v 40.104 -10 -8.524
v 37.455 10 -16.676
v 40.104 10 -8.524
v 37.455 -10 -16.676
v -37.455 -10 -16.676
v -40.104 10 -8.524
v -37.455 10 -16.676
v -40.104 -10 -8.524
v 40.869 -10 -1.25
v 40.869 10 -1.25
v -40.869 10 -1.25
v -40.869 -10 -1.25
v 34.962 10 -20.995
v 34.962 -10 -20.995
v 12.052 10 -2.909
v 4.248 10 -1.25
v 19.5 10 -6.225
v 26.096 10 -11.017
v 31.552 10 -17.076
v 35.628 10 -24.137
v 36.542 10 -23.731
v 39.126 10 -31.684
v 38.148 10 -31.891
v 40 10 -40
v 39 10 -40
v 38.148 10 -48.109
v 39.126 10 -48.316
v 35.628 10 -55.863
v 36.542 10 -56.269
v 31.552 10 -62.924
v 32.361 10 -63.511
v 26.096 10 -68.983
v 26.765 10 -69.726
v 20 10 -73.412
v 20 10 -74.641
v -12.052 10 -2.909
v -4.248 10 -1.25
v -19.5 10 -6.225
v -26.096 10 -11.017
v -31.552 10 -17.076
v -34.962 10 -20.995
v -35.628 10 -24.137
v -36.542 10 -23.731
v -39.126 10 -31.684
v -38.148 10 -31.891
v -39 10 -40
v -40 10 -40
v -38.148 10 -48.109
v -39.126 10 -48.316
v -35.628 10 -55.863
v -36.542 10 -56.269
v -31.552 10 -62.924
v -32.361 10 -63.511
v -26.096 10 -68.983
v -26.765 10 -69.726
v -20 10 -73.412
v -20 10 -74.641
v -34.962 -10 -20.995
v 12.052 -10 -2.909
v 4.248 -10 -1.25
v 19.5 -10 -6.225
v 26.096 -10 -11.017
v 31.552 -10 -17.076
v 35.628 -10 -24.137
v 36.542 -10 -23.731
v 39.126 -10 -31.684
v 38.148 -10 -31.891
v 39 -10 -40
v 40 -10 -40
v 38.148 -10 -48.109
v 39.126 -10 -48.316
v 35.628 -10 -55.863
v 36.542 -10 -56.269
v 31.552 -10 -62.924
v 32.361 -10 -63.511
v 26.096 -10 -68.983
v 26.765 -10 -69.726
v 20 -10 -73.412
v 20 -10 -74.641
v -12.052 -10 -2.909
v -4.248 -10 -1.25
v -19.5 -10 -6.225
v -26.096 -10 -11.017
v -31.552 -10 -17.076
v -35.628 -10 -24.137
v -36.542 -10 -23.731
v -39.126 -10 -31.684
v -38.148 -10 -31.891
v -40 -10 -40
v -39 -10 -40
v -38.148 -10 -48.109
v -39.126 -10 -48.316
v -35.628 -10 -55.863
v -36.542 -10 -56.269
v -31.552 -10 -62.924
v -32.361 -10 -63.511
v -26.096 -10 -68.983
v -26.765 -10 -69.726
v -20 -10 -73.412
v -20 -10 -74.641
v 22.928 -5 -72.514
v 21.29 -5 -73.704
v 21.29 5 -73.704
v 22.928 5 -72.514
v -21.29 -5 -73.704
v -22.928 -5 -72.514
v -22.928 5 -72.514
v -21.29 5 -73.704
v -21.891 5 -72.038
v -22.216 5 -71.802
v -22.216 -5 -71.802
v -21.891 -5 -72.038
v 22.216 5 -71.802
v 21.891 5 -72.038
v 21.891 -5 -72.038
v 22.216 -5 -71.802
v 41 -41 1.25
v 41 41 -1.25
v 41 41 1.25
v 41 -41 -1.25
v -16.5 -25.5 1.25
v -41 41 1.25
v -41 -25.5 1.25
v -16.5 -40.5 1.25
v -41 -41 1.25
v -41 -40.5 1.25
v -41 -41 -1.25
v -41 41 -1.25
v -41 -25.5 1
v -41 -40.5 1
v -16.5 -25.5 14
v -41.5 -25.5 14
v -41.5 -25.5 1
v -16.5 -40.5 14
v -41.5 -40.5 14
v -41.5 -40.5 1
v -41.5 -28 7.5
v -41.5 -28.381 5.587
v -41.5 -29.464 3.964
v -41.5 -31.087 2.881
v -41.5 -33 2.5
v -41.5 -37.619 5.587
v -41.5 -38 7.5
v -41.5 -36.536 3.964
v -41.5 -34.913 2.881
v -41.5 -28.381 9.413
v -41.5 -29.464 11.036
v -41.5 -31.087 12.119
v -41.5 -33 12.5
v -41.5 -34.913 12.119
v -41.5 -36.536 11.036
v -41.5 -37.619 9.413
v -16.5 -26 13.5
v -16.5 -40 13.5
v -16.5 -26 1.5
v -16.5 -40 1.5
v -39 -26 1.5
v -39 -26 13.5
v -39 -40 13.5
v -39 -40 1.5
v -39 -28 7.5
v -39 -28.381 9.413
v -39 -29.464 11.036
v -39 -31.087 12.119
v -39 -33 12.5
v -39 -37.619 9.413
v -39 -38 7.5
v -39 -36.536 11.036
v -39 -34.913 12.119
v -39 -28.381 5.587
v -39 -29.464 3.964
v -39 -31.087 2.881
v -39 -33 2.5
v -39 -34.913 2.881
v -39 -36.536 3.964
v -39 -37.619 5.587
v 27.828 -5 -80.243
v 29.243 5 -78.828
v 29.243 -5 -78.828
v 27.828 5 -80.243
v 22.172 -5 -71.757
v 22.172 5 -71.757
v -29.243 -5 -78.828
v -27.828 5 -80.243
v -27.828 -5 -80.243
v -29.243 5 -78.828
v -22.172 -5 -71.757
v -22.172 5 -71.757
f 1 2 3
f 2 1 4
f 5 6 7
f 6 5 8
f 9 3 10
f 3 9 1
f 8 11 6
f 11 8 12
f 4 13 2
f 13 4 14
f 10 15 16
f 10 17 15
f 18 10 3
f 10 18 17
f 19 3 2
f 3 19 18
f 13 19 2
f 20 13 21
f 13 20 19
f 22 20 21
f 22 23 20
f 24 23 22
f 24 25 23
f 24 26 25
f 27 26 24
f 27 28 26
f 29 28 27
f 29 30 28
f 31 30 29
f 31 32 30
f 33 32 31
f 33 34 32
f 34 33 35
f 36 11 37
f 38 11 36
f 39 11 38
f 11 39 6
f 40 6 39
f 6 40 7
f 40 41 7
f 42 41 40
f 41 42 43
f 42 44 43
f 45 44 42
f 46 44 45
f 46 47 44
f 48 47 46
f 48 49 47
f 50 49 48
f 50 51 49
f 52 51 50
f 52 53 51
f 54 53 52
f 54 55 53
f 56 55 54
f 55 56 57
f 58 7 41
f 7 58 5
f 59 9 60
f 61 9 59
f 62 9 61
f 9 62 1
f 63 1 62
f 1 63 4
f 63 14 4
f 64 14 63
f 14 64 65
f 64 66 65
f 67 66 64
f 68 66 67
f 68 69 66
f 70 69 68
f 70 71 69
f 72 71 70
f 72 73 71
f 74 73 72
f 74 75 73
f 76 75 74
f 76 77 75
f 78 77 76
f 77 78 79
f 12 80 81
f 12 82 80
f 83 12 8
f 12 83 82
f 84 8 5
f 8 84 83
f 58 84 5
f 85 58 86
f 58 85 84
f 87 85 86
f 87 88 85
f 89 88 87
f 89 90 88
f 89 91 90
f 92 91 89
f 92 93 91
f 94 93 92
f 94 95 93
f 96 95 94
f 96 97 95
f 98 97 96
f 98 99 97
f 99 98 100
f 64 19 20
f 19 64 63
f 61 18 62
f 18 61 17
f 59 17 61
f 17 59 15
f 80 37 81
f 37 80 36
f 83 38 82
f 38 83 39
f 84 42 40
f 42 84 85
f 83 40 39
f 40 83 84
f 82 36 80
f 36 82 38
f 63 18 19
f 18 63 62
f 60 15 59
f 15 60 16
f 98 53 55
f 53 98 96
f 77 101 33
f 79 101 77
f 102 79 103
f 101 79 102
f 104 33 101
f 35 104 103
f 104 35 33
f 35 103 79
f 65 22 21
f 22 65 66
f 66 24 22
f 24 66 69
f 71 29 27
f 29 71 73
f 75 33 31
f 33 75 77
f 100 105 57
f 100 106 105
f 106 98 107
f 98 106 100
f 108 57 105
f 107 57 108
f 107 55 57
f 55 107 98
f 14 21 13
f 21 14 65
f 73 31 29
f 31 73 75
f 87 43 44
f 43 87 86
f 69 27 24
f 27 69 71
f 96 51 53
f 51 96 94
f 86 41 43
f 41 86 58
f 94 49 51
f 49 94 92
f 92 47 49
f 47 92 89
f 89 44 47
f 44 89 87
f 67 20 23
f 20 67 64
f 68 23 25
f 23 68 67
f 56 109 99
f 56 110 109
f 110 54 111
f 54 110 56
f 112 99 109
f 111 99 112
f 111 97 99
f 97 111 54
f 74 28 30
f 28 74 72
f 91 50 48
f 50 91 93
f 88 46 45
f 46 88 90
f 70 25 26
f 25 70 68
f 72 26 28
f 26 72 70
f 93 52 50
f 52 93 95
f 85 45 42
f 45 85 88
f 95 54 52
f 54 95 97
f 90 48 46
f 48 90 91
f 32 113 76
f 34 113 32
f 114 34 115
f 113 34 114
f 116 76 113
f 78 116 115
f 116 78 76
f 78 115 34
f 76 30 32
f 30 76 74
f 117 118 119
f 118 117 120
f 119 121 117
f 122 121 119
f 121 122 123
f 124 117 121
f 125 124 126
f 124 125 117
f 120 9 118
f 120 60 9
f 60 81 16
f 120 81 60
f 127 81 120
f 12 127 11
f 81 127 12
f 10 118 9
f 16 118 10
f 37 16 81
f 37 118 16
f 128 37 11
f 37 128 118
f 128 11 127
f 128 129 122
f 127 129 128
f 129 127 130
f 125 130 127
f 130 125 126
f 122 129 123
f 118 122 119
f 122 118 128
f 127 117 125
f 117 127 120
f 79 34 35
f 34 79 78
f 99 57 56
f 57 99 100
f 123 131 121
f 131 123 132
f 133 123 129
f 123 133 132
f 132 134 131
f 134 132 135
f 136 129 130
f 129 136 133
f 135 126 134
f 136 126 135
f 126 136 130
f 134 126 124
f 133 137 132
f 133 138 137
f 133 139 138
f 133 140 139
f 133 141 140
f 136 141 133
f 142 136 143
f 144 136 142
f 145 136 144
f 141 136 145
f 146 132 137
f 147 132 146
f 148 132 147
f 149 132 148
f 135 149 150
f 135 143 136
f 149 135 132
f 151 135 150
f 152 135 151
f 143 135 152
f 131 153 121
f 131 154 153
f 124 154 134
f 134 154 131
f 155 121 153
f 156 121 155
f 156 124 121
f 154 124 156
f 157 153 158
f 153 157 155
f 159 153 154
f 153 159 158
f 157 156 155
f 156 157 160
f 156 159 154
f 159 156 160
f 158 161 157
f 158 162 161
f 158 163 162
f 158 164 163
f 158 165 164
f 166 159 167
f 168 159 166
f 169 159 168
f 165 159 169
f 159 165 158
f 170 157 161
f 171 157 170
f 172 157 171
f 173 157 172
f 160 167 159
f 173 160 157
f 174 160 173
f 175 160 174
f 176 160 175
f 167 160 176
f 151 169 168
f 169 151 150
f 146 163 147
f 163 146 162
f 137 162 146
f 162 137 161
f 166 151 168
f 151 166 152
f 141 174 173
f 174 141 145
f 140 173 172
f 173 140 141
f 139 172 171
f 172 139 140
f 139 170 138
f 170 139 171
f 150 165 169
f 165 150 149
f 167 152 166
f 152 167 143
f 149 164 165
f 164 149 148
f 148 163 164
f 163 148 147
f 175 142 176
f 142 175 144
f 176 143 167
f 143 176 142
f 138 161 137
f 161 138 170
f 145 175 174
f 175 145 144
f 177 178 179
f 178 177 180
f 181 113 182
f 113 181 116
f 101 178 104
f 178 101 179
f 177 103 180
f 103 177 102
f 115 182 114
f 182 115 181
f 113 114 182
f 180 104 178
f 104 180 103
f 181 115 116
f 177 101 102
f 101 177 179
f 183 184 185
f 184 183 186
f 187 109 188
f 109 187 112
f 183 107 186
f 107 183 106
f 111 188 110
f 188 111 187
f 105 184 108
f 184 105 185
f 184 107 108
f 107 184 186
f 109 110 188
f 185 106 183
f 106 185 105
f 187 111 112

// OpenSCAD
//holder for DC adapter
module dcHolder(){
    difference(){
        difference(){
            cube([15, 25, 13], center=true);
            translate([0,0-2])
            cube([14, 24, 12], center=true);
        };
        translate([0,5,0])
        rotate([90,0,0])
        cylinder(22, r=5, center=true);
    }
}

//breadboard holder
difference(){
    union(){
      cube([82, 82, 2.5], center=true);
        difference(){
            difference(){
                
                rotate([90,0,0])
                #cylinder(20,41,41, center=true);
                translate([0,0,22.5])
                cube([82, 82, 43], center=true);
            };
            rotate([90,0,0])
            translate([0,-40,0])
            cylinder(25, 78/2, 78/2, center=true);
        }


        difference(){
        rotate([90,0,0])
        translate([0,-40,0])
        cylinder(20, 80/2, 80/2, center=true);
        rotate([90,0,0])
        translate([0,-40,0])
        cylinder(25, 78/2, 78/2, center=true);
        }   
      };
    translate([0,0,-75])
    cube([40,40,40], center=true);
}

translate([25,0,-76])
rotate([0,45,0])
cube([10,10,2], center=true);

translate([-25,0,-76])
rotate([0,-45,0])
cube([10,10,2], center=true);


translate([-29,-33,7.5])
rotate([0,0,90])
dcHolder();
